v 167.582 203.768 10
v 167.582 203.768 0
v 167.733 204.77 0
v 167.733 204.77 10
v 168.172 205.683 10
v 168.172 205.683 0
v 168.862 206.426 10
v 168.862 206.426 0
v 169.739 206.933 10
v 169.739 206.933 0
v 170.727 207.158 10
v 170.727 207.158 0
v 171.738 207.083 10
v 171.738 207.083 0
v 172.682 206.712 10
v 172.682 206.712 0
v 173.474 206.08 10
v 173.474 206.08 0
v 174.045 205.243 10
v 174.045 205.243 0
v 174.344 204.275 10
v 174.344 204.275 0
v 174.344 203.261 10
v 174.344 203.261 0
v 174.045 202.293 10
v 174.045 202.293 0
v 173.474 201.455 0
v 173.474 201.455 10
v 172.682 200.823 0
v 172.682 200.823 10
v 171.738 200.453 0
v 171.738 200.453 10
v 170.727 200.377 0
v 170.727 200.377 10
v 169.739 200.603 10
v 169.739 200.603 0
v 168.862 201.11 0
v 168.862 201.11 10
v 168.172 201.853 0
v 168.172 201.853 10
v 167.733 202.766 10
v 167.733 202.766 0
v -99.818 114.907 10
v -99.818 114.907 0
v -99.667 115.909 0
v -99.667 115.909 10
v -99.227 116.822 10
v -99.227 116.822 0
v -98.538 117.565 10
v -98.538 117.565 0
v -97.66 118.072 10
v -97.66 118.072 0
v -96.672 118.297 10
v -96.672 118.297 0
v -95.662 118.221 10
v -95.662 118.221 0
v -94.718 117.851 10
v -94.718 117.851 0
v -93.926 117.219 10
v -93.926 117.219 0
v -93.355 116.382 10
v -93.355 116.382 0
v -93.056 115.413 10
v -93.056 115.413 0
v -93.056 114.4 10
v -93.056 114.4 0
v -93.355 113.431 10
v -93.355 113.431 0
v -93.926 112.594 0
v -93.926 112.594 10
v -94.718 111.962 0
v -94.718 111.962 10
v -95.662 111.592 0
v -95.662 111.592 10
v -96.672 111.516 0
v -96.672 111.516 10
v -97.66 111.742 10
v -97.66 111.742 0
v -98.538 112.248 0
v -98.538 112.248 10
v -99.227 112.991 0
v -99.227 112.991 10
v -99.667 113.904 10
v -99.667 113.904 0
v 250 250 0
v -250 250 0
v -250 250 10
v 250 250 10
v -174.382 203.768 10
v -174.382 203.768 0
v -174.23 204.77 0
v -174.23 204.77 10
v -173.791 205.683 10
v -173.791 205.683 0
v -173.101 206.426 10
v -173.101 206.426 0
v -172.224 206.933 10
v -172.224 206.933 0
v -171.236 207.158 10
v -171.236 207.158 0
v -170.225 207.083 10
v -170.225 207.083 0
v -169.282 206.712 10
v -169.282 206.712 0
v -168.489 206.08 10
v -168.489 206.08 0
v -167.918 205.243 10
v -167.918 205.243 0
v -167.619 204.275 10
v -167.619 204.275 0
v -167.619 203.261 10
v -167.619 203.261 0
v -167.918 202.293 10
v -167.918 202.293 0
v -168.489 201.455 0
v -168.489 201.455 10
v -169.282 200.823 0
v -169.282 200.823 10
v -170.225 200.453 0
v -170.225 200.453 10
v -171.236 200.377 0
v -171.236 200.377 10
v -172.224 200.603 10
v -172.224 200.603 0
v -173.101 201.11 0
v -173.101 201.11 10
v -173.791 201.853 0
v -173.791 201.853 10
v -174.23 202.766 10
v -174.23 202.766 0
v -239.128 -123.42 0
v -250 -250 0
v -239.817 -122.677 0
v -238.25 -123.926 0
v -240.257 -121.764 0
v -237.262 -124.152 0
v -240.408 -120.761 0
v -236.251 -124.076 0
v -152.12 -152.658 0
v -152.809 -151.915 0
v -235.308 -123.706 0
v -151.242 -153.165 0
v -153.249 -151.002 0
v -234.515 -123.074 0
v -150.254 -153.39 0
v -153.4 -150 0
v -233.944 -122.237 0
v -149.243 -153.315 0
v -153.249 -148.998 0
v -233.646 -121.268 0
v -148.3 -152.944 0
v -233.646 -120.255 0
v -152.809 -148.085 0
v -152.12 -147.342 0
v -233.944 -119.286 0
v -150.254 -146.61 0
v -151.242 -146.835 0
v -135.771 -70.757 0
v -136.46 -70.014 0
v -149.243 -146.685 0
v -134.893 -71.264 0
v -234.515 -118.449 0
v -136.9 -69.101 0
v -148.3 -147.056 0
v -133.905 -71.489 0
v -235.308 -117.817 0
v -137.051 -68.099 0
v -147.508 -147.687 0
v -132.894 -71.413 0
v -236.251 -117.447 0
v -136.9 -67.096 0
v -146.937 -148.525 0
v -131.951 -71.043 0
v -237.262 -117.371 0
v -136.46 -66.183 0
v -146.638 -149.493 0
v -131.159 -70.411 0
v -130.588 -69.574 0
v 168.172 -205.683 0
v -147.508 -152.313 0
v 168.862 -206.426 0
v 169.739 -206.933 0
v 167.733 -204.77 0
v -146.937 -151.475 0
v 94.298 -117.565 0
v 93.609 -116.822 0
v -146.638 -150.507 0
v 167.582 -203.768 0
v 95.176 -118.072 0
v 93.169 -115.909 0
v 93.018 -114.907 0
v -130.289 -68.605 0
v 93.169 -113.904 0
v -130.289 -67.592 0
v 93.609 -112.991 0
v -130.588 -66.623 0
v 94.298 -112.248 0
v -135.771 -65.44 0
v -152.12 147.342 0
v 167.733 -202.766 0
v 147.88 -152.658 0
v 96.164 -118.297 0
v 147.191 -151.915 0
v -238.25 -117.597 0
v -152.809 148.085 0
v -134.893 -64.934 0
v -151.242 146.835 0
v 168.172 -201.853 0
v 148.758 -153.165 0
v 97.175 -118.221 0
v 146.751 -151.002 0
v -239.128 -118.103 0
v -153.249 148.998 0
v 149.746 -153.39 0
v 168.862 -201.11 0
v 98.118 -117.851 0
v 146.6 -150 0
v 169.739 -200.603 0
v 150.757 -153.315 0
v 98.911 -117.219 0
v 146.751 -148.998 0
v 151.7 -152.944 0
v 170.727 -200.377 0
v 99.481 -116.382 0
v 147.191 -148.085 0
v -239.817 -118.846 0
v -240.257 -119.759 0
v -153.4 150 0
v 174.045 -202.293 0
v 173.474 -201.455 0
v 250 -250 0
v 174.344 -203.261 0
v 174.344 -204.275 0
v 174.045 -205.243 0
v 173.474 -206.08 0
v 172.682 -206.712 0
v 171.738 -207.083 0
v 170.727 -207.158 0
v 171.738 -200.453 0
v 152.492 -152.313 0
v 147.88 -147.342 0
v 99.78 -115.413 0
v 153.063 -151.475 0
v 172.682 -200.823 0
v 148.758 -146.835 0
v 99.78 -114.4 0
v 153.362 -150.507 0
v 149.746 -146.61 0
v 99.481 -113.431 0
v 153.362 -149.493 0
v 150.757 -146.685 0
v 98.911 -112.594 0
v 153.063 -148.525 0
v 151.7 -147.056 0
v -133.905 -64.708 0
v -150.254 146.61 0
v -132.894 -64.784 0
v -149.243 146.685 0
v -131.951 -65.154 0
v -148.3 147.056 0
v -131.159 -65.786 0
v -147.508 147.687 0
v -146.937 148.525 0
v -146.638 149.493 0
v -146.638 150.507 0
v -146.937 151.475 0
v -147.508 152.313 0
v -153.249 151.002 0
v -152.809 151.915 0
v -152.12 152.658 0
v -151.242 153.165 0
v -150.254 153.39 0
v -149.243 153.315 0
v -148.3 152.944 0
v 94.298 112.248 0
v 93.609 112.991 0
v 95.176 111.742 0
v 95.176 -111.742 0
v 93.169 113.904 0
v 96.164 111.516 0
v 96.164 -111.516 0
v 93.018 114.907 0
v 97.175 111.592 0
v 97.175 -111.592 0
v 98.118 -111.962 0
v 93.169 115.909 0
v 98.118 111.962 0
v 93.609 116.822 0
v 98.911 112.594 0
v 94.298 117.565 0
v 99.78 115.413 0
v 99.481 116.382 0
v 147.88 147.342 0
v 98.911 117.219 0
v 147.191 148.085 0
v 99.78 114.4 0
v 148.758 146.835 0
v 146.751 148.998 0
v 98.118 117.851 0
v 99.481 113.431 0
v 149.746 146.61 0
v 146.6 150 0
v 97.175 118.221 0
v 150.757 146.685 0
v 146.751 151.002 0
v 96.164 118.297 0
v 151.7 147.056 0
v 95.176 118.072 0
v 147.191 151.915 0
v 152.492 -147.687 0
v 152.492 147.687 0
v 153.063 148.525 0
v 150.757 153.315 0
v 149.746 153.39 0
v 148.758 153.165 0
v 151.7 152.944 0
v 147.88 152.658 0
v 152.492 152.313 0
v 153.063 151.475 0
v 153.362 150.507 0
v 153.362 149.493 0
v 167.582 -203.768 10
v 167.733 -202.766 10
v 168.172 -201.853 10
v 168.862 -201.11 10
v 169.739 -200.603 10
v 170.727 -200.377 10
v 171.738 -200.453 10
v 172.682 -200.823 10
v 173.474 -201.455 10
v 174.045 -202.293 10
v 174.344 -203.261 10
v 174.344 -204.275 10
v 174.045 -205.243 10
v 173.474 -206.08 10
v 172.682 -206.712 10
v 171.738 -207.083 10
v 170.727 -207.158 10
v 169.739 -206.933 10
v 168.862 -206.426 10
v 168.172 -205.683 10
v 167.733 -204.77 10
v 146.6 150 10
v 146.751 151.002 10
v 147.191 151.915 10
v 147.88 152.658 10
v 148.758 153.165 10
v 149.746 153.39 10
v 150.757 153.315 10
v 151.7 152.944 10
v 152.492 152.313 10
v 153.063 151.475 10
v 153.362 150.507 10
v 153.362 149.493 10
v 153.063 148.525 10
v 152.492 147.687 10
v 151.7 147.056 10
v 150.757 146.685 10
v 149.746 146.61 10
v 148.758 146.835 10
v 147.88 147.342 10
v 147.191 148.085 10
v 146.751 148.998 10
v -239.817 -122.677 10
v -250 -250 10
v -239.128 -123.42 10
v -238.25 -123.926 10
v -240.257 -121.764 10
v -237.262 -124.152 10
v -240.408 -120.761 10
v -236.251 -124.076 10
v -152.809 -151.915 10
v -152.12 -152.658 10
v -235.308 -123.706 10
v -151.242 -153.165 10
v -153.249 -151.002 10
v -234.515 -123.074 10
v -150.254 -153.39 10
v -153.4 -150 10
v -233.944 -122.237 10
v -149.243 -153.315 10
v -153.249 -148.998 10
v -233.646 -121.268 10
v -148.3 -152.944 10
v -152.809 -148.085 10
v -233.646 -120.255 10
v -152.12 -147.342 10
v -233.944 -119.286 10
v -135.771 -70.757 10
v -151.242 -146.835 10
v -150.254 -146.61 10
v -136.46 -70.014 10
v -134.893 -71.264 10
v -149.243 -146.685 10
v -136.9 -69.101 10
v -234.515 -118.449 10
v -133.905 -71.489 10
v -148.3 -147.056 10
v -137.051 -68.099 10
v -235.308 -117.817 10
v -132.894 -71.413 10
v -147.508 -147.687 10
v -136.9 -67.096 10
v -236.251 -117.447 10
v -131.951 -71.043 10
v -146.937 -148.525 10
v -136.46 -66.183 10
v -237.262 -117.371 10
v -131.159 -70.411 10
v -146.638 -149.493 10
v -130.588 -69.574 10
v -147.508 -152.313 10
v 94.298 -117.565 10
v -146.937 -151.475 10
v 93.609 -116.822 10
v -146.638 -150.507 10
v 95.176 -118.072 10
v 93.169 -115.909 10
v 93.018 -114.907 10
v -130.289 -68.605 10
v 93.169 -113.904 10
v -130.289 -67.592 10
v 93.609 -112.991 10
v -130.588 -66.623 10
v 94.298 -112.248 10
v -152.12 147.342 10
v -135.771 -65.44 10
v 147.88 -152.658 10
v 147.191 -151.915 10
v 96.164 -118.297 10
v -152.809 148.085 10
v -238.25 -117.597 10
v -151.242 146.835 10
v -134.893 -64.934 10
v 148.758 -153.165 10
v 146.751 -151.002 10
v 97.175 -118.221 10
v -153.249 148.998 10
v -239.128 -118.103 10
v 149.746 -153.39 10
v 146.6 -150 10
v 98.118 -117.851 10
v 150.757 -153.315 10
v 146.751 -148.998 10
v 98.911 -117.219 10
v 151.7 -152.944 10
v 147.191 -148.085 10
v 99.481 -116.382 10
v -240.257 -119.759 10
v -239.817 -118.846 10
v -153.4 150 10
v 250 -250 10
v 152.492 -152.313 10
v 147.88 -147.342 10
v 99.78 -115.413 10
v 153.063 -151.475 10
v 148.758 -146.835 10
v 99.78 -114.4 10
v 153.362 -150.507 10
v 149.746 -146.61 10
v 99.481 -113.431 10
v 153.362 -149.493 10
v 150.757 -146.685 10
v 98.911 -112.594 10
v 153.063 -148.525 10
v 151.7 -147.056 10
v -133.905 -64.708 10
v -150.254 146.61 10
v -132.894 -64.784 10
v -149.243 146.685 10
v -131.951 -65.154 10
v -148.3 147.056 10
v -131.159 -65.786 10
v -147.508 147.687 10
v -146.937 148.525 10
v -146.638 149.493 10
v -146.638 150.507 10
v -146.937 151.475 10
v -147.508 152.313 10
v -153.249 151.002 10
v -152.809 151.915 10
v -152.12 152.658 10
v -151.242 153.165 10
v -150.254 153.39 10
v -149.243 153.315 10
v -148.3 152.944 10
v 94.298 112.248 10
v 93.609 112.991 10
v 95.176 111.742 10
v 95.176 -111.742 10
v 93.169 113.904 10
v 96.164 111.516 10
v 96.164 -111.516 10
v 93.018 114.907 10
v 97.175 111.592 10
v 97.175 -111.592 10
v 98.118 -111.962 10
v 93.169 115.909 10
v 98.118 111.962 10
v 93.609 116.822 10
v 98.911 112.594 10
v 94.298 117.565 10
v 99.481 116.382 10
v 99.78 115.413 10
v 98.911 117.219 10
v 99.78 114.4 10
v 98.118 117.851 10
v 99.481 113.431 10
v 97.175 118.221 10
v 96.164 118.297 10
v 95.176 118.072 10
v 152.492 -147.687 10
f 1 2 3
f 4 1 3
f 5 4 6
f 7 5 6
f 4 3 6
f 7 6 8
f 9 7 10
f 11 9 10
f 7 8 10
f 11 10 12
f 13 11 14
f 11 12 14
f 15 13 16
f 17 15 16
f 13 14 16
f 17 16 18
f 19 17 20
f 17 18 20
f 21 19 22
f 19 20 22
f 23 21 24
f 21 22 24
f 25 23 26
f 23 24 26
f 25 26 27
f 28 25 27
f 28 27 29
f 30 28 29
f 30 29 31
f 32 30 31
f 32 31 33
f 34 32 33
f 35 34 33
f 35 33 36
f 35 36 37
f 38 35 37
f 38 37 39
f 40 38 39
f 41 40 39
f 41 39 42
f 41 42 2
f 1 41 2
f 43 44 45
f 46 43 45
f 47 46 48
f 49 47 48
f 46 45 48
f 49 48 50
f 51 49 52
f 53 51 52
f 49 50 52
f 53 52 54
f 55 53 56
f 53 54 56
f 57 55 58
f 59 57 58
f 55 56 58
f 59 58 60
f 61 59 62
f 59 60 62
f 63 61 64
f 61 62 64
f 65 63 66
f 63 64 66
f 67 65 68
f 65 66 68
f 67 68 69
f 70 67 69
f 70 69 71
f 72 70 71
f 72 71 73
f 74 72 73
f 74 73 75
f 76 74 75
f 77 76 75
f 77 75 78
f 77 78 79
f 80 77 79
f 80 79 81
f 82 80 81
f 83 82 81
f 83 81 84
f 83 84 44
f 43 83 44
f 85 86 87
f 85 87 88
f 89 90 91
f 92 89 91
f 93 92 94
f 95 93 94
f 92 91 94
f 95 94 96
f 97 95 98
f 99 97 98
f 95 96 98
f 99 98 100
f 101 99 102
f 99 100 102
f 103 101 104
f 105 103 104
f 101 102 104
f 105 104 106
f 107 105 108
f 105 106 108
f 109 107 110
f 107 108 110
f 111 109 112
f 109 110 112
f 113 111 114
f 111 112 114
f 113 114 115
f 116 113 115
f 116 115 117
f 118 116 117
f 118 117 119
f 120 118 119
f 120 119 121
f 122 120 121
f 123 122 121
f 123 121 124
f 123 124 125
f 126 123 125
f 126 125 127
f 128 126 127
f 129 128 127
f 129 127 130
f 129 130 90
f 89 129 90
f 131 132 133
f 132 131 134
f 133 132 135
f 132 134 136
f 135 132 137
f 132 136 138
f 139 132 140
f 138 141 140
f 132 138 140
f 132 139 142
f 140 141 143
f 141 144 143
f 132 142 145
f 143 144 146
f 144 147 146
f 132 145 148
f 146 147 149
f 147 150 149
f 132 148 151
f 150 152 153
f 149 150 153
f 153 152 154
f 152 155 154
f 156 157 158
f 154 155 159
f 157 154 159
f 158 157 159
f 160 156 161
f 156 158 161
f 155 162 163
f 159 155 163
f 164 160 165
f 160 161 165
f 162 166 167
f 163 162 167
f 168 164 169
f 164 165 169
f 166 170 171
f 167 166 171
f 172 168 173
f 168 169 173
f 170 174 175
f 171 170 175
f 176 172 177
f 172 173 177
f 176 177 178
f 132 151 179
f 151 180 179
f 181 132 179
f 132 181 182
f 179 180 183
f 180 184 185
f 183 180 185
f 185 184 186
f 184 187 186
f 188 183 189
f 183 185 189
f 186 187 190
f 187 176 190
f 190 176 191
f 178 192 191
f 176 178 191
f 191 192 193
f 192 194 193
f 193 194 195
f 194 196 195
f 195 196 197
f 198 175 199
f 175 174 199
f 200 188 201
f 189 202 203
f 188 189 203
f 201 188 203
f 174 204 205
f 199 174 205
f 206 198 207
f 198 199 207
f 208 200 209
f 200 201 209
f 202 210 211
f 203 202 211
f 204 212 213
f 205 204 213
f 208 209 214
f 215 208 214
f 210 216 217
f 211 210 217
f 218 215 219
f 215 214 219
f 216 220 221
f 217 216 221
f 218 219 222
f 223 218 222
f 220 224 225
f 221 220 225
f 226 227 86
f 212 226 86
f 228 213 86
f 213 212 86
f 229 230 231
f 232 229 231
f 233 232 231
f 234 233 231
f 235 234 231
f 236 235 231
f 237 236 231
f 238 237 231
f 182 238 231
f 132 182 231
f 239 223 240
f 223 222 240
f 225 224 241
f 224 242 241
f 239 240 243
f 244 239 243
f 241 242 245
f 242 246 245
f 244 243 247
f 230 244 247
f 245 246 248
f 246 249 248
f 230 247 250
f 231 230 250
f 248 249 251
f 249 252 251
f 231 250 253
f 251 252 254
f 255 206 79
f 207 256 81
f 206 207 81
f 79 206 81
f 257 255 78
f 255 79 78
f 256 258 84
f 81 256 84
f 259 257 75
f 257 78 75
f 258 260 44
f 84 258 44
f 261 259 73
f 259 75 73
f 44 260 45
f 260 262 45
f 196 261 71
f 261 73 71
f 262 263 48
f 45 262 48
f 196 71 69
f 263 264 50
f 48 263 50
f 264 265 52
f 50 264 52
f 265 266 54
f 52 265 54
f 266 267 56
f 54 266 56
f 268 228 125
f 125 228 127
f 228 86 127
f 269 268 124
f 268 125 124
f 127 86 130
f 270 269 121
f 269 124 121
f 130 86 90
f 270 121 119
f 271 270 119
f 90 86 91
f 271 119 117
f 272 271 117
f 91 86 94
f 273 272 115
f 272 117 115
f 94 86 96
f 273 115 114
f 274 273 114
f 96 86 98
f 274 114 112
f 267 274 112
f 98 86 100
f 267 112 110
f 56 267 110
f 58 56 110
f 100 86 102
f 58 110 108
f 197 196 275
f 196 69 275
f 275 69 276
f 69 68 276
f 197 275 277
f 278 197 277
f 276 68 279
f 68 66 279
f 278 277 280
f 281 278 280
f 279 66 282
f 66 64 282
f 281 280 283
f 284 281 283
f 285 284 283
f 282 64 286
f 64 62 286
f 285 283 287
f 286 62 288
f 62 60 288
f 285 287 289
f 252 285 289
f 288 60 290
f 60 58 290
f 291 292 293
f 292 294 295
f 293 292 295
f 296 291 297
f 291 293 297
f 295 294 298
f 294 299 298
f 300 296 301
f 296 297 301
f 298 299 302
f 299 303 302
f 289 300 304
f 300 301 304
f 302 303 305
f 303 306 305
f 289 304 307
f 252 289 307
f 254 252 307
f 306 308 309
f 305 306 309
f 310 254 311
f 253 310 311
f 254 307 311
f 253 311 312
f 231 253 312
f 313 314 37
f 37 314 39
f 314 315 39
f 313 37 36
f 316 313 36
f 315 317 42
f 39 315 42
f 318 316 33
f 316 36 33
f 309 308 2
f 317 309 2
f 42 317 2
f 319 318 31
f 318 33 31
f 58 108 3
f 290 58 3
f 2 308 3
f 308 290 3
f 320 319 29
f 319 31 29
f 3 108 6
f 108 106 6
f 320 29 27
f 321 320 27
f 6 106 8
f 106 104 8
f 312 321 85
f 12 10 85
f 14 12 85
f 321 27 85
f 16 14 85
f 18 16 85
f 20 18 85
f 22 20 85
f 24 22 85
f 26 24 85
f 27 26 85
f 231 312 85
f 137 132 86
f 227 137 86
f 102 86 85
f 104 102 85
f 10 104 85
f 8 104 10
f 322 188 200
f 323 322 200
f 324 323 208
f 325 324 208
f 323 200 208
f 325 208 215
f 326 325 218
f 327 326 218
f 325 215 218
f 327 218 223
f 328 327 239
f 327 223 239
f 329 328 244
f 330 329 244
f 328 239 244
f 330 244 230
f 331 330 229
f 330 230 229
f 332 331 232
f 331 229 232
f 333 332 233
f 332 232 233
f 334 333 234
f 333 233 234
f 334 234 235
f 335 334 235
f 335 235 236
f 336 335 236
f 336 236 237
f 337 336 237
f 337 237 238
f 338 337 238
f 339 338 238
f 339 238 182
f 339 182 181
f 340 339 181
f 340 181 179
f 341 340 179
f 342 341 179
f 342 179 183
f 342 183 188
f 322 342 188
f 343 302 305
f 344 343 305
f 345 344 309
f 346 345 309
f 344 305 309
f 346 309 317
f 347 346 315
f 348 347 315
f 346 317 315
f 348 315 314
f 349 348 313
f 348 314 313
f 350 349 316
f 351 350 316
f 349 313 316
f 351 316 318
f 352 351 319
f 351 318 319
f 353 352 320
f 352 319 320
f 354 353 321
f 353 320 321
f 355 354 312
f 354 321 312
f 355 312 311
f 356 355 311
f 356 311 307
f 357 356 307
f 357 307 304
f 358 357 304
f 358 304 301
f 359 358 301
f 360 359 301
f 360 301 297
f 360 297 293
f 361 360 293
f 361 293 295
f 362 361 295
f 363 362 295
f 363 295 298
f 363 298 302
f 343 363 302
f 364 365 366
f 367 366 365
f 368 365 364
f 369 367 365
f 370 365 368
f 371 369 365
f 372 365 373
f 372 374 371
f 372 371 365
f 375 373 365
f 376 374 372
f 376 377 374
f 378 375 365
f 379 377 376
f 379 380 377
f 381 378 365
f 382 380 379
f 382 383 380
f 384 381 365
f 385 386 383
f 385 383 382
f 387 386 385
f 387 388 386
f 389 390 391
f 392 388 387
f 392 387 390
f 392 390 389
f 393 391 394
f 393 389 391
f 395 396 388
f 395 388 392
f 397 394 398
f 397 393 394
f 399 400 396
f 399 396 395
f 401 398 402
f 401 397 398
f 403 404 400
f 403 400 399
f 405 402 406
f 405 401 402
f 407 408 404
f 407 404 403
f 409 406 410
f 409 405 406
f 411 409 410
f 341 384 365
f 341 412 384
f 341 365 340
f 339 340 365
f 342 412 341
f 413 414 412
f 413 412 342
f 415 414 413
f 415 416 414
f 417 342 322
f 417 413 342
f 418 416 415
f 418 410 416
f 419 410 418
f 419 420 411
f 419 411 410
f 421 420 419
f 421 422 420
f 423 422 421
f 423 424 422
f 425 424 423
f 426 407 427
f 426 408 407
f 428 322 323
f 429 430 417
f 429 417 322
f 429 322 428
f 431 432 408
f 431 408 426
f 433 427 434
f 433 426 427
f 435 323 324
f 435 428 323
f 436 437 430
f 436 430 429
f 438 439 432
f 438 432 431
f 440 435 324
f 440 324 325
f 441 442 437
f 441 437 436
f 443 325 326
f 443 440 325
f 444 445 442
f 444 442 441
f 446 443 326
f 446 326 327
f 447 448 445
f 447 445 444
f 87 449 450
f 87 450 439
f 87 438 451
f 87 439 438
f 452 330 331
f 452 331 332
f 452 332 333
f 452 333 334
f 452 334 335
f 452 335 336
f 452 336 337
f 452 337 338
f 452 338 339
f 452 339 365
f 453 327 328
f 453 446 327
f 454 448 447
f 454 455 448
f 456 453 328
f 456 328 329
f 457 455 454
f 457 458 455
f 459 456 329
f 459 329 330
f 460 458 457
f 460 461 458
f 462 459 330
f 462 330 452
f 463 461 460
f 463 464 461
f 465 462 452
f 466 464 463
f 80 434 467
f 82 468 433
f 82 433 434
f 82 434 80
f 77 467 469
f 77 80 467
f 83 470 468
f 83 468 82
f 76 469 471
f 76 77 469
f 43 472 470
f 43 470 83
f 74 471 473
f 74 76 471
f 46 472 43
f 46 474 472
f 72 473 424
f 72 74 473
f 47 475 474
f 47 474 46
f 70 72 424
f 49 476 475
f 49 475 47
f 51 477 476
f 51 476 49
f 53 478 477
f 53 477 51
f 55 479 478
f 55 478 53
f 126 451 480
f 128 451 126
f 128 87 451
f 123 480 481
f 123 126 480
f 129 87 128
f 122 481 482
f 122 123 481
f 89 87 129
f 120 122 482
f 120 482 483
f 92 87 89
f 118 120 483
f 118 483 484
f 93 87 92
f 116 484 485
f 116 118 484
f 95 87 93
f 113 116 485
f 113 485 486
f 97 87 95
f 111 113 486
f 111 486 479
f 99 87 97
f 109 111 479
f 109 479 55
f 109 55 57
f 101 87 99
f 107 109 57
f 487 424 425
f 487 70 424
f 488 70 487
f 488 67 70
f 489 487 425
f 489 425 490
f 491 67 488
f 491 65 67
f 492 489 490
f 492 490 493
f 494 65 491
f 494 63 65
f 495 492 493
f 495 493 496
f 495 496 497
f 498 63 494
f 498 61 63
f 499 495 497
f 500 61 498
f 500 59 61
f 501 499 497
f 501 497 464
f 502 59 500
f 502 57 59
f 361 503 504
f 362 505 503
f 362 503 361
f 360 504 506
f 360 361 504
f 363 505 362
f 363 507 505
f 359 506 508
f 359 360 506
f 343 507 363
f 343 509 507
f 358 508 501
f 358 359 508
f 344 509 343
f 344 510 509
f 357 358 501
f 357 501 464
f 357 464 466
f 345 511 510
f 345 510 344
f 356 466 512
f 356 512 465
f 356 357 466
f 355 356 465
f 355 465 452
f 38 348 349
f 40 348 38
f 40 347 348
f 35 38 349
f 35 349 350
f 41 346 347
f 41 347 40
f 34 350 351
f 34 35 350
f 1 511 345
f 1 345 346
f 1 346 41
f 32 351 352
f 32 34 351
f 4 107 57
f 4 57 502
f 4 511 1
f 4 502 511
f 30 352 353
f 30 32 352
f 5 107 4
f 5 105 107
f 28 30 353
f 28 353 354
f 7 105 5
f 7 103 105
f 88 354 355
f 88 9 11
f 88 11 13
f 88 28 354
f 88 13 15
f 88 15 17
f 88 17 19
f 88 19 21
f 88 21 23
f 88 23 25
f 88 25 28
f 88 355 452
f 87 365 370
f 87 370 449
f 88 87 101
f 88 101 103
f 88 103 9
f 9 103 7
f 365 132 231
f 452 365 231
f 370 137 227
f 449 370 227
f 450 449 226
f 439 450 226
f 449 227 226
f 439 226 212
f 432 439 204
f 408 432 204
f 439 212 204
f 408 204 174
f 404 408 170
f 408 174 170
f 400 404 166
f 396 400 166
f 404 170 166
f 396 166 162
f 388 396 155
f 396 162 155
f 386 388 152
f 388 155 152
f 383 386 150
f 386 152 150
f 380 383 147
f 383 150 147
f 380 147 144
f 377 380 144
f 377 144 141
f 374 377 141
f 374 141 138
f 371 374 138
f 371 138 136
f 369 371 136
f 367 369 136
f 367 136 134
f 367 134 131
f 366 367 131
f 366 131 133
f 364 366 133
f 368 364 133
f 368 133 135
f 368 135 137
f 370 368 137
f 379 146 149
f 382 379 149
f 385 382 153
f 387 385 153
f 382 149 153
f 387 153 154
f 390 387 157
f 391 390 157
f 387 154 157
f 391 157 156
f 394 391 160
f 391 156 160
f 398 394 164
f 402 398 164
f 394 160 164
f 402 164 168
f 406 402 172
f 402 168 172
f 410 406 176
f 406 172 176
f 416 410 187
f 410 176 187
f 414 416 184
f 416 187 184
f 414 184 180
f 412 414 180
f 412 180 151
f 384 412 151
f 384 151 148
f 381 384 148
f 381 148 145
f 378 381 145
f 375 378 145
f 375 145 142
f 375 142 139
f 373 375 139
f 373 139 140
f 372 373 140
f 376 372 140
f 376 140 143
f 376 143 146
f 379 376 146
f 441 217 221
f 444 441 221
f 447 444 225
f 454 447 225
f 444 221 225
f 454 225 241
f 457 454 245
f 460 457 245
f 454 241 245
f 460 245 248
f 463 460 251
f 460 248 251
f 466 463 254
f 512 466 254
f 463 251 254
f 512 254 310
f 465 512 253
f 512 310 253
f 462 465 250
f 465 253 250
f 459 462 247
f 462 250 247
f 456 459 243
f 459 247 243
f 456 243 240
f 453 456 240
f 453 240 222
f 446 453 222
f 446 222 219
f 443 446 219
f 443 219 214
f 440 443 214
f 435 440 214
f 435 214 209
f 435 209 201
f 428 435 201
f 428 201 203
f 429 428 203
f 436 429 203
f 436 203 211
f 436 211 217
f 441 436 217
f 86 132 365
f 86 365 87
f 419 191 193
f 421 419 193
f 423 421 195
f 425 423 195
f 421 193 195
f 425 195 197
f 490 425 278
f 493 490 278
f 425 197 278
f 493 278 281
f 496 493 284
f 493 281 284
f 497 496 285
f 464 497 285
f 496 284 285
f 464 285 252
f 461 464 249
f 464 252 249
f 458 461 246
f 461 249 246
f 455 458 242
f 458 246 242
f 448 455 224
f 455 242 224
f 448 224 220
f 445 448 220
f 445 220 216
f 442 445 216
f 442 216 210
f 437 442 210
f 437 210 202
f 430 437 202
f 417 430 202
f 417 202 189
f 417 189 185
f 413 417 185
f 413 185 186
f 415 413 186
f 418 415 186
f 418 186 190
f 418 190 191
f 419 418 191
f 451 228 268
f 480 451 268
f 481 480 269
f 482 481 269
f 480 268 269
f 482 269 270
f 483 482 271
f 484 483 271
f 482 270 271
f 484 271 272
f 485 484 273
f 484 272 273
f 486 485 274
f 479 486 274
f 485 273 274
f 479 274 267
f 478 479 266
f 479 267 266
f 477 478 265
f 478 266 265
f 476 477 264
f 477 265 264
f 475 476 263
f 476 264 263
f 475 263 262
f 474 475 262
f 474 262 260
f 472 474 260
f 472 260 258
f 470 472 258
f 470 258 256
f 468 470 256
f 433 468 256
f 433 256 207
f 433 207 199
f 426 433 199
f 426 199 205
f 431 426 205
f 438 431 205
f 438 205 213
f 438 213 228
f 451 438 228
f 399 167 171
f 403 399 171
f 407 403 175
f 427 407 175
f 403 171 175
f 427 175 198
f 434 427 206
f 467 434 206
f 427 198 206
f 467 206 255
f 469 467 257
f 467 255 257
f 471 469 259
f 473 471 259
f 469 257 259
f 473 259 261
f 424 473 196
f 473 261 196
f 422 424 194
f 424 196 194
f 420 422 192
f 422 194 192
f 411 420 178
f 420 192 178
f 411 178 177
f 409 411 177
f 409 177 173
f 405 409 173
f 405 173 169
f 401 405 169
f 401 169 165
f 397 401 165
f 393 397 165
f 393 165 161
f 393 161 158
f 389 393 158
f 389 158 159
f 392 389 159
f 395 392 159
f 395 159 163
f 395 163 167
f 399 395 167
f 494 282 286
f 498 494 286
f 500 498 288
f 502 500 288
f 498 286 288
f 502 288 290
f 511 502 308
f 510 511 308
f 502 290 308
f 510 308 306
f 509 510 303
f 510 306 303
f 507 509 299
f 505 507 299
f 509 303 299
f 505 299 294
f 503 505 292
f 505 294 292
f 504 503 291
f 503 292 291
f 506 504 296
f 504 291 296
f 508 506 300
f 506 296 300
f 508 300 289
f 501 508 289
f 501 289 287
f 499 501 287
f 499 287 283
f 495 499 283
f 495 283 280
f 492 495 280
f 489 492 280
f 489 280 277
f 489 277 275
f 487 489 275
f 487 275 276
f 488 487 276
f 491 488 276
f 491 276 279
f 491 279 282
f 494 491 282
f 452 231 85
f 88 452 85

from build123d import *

# Parameters (mm, degrees)
SKETCH_1_W      = 500
SKETCH_1_H      = 500
EXTRUDE_1_DEPTH = 10
M8X1_25_2_D     = 6.8
M8X1_25_1_D     = 6.8


with BuildPart() as part:
    # ｽｹｯﾁ1 → ﾎﾞｽ - 押し出し1 (new body)
    with BuildSketch(Plane.XY):
        Rectangle(SKETCH_1_W, SKETCH_1_H)
    extrude(amount=EXTRUDE_1_DEPTH)

    # M8x1.25 ねじ穴2 (through all)
    with Locations(Plane(origin=(-150, 150, 10), x_dir=(1, 0, 0), z_dir=(0, 0, 1))):
        with Locations((0, 0), (300, 0), (0, -300), (300, -300)):
            Hole(M8X1_25_2_D / 2)

    # M8x1.25 ねじ穴1 (through all)
    with Locations(Plane(origin=(-96.418141453, 114.906666468, 10), x_dir=(1, 0, 0), z_dir=(0, 0, 1))):
        with Locations((0, 0), (192.836282906, 0), (192.836282906, -229.813332936), (-37.232837175, -183.005241429), (-74.563362724, 88.861155402), (267.39964563, 88.861155402), (-140.589593981, -235.668139399), (267.39964563, -318.674488338)):
            Hole(M8X1_25_1_D / 2)


solid = part.part
